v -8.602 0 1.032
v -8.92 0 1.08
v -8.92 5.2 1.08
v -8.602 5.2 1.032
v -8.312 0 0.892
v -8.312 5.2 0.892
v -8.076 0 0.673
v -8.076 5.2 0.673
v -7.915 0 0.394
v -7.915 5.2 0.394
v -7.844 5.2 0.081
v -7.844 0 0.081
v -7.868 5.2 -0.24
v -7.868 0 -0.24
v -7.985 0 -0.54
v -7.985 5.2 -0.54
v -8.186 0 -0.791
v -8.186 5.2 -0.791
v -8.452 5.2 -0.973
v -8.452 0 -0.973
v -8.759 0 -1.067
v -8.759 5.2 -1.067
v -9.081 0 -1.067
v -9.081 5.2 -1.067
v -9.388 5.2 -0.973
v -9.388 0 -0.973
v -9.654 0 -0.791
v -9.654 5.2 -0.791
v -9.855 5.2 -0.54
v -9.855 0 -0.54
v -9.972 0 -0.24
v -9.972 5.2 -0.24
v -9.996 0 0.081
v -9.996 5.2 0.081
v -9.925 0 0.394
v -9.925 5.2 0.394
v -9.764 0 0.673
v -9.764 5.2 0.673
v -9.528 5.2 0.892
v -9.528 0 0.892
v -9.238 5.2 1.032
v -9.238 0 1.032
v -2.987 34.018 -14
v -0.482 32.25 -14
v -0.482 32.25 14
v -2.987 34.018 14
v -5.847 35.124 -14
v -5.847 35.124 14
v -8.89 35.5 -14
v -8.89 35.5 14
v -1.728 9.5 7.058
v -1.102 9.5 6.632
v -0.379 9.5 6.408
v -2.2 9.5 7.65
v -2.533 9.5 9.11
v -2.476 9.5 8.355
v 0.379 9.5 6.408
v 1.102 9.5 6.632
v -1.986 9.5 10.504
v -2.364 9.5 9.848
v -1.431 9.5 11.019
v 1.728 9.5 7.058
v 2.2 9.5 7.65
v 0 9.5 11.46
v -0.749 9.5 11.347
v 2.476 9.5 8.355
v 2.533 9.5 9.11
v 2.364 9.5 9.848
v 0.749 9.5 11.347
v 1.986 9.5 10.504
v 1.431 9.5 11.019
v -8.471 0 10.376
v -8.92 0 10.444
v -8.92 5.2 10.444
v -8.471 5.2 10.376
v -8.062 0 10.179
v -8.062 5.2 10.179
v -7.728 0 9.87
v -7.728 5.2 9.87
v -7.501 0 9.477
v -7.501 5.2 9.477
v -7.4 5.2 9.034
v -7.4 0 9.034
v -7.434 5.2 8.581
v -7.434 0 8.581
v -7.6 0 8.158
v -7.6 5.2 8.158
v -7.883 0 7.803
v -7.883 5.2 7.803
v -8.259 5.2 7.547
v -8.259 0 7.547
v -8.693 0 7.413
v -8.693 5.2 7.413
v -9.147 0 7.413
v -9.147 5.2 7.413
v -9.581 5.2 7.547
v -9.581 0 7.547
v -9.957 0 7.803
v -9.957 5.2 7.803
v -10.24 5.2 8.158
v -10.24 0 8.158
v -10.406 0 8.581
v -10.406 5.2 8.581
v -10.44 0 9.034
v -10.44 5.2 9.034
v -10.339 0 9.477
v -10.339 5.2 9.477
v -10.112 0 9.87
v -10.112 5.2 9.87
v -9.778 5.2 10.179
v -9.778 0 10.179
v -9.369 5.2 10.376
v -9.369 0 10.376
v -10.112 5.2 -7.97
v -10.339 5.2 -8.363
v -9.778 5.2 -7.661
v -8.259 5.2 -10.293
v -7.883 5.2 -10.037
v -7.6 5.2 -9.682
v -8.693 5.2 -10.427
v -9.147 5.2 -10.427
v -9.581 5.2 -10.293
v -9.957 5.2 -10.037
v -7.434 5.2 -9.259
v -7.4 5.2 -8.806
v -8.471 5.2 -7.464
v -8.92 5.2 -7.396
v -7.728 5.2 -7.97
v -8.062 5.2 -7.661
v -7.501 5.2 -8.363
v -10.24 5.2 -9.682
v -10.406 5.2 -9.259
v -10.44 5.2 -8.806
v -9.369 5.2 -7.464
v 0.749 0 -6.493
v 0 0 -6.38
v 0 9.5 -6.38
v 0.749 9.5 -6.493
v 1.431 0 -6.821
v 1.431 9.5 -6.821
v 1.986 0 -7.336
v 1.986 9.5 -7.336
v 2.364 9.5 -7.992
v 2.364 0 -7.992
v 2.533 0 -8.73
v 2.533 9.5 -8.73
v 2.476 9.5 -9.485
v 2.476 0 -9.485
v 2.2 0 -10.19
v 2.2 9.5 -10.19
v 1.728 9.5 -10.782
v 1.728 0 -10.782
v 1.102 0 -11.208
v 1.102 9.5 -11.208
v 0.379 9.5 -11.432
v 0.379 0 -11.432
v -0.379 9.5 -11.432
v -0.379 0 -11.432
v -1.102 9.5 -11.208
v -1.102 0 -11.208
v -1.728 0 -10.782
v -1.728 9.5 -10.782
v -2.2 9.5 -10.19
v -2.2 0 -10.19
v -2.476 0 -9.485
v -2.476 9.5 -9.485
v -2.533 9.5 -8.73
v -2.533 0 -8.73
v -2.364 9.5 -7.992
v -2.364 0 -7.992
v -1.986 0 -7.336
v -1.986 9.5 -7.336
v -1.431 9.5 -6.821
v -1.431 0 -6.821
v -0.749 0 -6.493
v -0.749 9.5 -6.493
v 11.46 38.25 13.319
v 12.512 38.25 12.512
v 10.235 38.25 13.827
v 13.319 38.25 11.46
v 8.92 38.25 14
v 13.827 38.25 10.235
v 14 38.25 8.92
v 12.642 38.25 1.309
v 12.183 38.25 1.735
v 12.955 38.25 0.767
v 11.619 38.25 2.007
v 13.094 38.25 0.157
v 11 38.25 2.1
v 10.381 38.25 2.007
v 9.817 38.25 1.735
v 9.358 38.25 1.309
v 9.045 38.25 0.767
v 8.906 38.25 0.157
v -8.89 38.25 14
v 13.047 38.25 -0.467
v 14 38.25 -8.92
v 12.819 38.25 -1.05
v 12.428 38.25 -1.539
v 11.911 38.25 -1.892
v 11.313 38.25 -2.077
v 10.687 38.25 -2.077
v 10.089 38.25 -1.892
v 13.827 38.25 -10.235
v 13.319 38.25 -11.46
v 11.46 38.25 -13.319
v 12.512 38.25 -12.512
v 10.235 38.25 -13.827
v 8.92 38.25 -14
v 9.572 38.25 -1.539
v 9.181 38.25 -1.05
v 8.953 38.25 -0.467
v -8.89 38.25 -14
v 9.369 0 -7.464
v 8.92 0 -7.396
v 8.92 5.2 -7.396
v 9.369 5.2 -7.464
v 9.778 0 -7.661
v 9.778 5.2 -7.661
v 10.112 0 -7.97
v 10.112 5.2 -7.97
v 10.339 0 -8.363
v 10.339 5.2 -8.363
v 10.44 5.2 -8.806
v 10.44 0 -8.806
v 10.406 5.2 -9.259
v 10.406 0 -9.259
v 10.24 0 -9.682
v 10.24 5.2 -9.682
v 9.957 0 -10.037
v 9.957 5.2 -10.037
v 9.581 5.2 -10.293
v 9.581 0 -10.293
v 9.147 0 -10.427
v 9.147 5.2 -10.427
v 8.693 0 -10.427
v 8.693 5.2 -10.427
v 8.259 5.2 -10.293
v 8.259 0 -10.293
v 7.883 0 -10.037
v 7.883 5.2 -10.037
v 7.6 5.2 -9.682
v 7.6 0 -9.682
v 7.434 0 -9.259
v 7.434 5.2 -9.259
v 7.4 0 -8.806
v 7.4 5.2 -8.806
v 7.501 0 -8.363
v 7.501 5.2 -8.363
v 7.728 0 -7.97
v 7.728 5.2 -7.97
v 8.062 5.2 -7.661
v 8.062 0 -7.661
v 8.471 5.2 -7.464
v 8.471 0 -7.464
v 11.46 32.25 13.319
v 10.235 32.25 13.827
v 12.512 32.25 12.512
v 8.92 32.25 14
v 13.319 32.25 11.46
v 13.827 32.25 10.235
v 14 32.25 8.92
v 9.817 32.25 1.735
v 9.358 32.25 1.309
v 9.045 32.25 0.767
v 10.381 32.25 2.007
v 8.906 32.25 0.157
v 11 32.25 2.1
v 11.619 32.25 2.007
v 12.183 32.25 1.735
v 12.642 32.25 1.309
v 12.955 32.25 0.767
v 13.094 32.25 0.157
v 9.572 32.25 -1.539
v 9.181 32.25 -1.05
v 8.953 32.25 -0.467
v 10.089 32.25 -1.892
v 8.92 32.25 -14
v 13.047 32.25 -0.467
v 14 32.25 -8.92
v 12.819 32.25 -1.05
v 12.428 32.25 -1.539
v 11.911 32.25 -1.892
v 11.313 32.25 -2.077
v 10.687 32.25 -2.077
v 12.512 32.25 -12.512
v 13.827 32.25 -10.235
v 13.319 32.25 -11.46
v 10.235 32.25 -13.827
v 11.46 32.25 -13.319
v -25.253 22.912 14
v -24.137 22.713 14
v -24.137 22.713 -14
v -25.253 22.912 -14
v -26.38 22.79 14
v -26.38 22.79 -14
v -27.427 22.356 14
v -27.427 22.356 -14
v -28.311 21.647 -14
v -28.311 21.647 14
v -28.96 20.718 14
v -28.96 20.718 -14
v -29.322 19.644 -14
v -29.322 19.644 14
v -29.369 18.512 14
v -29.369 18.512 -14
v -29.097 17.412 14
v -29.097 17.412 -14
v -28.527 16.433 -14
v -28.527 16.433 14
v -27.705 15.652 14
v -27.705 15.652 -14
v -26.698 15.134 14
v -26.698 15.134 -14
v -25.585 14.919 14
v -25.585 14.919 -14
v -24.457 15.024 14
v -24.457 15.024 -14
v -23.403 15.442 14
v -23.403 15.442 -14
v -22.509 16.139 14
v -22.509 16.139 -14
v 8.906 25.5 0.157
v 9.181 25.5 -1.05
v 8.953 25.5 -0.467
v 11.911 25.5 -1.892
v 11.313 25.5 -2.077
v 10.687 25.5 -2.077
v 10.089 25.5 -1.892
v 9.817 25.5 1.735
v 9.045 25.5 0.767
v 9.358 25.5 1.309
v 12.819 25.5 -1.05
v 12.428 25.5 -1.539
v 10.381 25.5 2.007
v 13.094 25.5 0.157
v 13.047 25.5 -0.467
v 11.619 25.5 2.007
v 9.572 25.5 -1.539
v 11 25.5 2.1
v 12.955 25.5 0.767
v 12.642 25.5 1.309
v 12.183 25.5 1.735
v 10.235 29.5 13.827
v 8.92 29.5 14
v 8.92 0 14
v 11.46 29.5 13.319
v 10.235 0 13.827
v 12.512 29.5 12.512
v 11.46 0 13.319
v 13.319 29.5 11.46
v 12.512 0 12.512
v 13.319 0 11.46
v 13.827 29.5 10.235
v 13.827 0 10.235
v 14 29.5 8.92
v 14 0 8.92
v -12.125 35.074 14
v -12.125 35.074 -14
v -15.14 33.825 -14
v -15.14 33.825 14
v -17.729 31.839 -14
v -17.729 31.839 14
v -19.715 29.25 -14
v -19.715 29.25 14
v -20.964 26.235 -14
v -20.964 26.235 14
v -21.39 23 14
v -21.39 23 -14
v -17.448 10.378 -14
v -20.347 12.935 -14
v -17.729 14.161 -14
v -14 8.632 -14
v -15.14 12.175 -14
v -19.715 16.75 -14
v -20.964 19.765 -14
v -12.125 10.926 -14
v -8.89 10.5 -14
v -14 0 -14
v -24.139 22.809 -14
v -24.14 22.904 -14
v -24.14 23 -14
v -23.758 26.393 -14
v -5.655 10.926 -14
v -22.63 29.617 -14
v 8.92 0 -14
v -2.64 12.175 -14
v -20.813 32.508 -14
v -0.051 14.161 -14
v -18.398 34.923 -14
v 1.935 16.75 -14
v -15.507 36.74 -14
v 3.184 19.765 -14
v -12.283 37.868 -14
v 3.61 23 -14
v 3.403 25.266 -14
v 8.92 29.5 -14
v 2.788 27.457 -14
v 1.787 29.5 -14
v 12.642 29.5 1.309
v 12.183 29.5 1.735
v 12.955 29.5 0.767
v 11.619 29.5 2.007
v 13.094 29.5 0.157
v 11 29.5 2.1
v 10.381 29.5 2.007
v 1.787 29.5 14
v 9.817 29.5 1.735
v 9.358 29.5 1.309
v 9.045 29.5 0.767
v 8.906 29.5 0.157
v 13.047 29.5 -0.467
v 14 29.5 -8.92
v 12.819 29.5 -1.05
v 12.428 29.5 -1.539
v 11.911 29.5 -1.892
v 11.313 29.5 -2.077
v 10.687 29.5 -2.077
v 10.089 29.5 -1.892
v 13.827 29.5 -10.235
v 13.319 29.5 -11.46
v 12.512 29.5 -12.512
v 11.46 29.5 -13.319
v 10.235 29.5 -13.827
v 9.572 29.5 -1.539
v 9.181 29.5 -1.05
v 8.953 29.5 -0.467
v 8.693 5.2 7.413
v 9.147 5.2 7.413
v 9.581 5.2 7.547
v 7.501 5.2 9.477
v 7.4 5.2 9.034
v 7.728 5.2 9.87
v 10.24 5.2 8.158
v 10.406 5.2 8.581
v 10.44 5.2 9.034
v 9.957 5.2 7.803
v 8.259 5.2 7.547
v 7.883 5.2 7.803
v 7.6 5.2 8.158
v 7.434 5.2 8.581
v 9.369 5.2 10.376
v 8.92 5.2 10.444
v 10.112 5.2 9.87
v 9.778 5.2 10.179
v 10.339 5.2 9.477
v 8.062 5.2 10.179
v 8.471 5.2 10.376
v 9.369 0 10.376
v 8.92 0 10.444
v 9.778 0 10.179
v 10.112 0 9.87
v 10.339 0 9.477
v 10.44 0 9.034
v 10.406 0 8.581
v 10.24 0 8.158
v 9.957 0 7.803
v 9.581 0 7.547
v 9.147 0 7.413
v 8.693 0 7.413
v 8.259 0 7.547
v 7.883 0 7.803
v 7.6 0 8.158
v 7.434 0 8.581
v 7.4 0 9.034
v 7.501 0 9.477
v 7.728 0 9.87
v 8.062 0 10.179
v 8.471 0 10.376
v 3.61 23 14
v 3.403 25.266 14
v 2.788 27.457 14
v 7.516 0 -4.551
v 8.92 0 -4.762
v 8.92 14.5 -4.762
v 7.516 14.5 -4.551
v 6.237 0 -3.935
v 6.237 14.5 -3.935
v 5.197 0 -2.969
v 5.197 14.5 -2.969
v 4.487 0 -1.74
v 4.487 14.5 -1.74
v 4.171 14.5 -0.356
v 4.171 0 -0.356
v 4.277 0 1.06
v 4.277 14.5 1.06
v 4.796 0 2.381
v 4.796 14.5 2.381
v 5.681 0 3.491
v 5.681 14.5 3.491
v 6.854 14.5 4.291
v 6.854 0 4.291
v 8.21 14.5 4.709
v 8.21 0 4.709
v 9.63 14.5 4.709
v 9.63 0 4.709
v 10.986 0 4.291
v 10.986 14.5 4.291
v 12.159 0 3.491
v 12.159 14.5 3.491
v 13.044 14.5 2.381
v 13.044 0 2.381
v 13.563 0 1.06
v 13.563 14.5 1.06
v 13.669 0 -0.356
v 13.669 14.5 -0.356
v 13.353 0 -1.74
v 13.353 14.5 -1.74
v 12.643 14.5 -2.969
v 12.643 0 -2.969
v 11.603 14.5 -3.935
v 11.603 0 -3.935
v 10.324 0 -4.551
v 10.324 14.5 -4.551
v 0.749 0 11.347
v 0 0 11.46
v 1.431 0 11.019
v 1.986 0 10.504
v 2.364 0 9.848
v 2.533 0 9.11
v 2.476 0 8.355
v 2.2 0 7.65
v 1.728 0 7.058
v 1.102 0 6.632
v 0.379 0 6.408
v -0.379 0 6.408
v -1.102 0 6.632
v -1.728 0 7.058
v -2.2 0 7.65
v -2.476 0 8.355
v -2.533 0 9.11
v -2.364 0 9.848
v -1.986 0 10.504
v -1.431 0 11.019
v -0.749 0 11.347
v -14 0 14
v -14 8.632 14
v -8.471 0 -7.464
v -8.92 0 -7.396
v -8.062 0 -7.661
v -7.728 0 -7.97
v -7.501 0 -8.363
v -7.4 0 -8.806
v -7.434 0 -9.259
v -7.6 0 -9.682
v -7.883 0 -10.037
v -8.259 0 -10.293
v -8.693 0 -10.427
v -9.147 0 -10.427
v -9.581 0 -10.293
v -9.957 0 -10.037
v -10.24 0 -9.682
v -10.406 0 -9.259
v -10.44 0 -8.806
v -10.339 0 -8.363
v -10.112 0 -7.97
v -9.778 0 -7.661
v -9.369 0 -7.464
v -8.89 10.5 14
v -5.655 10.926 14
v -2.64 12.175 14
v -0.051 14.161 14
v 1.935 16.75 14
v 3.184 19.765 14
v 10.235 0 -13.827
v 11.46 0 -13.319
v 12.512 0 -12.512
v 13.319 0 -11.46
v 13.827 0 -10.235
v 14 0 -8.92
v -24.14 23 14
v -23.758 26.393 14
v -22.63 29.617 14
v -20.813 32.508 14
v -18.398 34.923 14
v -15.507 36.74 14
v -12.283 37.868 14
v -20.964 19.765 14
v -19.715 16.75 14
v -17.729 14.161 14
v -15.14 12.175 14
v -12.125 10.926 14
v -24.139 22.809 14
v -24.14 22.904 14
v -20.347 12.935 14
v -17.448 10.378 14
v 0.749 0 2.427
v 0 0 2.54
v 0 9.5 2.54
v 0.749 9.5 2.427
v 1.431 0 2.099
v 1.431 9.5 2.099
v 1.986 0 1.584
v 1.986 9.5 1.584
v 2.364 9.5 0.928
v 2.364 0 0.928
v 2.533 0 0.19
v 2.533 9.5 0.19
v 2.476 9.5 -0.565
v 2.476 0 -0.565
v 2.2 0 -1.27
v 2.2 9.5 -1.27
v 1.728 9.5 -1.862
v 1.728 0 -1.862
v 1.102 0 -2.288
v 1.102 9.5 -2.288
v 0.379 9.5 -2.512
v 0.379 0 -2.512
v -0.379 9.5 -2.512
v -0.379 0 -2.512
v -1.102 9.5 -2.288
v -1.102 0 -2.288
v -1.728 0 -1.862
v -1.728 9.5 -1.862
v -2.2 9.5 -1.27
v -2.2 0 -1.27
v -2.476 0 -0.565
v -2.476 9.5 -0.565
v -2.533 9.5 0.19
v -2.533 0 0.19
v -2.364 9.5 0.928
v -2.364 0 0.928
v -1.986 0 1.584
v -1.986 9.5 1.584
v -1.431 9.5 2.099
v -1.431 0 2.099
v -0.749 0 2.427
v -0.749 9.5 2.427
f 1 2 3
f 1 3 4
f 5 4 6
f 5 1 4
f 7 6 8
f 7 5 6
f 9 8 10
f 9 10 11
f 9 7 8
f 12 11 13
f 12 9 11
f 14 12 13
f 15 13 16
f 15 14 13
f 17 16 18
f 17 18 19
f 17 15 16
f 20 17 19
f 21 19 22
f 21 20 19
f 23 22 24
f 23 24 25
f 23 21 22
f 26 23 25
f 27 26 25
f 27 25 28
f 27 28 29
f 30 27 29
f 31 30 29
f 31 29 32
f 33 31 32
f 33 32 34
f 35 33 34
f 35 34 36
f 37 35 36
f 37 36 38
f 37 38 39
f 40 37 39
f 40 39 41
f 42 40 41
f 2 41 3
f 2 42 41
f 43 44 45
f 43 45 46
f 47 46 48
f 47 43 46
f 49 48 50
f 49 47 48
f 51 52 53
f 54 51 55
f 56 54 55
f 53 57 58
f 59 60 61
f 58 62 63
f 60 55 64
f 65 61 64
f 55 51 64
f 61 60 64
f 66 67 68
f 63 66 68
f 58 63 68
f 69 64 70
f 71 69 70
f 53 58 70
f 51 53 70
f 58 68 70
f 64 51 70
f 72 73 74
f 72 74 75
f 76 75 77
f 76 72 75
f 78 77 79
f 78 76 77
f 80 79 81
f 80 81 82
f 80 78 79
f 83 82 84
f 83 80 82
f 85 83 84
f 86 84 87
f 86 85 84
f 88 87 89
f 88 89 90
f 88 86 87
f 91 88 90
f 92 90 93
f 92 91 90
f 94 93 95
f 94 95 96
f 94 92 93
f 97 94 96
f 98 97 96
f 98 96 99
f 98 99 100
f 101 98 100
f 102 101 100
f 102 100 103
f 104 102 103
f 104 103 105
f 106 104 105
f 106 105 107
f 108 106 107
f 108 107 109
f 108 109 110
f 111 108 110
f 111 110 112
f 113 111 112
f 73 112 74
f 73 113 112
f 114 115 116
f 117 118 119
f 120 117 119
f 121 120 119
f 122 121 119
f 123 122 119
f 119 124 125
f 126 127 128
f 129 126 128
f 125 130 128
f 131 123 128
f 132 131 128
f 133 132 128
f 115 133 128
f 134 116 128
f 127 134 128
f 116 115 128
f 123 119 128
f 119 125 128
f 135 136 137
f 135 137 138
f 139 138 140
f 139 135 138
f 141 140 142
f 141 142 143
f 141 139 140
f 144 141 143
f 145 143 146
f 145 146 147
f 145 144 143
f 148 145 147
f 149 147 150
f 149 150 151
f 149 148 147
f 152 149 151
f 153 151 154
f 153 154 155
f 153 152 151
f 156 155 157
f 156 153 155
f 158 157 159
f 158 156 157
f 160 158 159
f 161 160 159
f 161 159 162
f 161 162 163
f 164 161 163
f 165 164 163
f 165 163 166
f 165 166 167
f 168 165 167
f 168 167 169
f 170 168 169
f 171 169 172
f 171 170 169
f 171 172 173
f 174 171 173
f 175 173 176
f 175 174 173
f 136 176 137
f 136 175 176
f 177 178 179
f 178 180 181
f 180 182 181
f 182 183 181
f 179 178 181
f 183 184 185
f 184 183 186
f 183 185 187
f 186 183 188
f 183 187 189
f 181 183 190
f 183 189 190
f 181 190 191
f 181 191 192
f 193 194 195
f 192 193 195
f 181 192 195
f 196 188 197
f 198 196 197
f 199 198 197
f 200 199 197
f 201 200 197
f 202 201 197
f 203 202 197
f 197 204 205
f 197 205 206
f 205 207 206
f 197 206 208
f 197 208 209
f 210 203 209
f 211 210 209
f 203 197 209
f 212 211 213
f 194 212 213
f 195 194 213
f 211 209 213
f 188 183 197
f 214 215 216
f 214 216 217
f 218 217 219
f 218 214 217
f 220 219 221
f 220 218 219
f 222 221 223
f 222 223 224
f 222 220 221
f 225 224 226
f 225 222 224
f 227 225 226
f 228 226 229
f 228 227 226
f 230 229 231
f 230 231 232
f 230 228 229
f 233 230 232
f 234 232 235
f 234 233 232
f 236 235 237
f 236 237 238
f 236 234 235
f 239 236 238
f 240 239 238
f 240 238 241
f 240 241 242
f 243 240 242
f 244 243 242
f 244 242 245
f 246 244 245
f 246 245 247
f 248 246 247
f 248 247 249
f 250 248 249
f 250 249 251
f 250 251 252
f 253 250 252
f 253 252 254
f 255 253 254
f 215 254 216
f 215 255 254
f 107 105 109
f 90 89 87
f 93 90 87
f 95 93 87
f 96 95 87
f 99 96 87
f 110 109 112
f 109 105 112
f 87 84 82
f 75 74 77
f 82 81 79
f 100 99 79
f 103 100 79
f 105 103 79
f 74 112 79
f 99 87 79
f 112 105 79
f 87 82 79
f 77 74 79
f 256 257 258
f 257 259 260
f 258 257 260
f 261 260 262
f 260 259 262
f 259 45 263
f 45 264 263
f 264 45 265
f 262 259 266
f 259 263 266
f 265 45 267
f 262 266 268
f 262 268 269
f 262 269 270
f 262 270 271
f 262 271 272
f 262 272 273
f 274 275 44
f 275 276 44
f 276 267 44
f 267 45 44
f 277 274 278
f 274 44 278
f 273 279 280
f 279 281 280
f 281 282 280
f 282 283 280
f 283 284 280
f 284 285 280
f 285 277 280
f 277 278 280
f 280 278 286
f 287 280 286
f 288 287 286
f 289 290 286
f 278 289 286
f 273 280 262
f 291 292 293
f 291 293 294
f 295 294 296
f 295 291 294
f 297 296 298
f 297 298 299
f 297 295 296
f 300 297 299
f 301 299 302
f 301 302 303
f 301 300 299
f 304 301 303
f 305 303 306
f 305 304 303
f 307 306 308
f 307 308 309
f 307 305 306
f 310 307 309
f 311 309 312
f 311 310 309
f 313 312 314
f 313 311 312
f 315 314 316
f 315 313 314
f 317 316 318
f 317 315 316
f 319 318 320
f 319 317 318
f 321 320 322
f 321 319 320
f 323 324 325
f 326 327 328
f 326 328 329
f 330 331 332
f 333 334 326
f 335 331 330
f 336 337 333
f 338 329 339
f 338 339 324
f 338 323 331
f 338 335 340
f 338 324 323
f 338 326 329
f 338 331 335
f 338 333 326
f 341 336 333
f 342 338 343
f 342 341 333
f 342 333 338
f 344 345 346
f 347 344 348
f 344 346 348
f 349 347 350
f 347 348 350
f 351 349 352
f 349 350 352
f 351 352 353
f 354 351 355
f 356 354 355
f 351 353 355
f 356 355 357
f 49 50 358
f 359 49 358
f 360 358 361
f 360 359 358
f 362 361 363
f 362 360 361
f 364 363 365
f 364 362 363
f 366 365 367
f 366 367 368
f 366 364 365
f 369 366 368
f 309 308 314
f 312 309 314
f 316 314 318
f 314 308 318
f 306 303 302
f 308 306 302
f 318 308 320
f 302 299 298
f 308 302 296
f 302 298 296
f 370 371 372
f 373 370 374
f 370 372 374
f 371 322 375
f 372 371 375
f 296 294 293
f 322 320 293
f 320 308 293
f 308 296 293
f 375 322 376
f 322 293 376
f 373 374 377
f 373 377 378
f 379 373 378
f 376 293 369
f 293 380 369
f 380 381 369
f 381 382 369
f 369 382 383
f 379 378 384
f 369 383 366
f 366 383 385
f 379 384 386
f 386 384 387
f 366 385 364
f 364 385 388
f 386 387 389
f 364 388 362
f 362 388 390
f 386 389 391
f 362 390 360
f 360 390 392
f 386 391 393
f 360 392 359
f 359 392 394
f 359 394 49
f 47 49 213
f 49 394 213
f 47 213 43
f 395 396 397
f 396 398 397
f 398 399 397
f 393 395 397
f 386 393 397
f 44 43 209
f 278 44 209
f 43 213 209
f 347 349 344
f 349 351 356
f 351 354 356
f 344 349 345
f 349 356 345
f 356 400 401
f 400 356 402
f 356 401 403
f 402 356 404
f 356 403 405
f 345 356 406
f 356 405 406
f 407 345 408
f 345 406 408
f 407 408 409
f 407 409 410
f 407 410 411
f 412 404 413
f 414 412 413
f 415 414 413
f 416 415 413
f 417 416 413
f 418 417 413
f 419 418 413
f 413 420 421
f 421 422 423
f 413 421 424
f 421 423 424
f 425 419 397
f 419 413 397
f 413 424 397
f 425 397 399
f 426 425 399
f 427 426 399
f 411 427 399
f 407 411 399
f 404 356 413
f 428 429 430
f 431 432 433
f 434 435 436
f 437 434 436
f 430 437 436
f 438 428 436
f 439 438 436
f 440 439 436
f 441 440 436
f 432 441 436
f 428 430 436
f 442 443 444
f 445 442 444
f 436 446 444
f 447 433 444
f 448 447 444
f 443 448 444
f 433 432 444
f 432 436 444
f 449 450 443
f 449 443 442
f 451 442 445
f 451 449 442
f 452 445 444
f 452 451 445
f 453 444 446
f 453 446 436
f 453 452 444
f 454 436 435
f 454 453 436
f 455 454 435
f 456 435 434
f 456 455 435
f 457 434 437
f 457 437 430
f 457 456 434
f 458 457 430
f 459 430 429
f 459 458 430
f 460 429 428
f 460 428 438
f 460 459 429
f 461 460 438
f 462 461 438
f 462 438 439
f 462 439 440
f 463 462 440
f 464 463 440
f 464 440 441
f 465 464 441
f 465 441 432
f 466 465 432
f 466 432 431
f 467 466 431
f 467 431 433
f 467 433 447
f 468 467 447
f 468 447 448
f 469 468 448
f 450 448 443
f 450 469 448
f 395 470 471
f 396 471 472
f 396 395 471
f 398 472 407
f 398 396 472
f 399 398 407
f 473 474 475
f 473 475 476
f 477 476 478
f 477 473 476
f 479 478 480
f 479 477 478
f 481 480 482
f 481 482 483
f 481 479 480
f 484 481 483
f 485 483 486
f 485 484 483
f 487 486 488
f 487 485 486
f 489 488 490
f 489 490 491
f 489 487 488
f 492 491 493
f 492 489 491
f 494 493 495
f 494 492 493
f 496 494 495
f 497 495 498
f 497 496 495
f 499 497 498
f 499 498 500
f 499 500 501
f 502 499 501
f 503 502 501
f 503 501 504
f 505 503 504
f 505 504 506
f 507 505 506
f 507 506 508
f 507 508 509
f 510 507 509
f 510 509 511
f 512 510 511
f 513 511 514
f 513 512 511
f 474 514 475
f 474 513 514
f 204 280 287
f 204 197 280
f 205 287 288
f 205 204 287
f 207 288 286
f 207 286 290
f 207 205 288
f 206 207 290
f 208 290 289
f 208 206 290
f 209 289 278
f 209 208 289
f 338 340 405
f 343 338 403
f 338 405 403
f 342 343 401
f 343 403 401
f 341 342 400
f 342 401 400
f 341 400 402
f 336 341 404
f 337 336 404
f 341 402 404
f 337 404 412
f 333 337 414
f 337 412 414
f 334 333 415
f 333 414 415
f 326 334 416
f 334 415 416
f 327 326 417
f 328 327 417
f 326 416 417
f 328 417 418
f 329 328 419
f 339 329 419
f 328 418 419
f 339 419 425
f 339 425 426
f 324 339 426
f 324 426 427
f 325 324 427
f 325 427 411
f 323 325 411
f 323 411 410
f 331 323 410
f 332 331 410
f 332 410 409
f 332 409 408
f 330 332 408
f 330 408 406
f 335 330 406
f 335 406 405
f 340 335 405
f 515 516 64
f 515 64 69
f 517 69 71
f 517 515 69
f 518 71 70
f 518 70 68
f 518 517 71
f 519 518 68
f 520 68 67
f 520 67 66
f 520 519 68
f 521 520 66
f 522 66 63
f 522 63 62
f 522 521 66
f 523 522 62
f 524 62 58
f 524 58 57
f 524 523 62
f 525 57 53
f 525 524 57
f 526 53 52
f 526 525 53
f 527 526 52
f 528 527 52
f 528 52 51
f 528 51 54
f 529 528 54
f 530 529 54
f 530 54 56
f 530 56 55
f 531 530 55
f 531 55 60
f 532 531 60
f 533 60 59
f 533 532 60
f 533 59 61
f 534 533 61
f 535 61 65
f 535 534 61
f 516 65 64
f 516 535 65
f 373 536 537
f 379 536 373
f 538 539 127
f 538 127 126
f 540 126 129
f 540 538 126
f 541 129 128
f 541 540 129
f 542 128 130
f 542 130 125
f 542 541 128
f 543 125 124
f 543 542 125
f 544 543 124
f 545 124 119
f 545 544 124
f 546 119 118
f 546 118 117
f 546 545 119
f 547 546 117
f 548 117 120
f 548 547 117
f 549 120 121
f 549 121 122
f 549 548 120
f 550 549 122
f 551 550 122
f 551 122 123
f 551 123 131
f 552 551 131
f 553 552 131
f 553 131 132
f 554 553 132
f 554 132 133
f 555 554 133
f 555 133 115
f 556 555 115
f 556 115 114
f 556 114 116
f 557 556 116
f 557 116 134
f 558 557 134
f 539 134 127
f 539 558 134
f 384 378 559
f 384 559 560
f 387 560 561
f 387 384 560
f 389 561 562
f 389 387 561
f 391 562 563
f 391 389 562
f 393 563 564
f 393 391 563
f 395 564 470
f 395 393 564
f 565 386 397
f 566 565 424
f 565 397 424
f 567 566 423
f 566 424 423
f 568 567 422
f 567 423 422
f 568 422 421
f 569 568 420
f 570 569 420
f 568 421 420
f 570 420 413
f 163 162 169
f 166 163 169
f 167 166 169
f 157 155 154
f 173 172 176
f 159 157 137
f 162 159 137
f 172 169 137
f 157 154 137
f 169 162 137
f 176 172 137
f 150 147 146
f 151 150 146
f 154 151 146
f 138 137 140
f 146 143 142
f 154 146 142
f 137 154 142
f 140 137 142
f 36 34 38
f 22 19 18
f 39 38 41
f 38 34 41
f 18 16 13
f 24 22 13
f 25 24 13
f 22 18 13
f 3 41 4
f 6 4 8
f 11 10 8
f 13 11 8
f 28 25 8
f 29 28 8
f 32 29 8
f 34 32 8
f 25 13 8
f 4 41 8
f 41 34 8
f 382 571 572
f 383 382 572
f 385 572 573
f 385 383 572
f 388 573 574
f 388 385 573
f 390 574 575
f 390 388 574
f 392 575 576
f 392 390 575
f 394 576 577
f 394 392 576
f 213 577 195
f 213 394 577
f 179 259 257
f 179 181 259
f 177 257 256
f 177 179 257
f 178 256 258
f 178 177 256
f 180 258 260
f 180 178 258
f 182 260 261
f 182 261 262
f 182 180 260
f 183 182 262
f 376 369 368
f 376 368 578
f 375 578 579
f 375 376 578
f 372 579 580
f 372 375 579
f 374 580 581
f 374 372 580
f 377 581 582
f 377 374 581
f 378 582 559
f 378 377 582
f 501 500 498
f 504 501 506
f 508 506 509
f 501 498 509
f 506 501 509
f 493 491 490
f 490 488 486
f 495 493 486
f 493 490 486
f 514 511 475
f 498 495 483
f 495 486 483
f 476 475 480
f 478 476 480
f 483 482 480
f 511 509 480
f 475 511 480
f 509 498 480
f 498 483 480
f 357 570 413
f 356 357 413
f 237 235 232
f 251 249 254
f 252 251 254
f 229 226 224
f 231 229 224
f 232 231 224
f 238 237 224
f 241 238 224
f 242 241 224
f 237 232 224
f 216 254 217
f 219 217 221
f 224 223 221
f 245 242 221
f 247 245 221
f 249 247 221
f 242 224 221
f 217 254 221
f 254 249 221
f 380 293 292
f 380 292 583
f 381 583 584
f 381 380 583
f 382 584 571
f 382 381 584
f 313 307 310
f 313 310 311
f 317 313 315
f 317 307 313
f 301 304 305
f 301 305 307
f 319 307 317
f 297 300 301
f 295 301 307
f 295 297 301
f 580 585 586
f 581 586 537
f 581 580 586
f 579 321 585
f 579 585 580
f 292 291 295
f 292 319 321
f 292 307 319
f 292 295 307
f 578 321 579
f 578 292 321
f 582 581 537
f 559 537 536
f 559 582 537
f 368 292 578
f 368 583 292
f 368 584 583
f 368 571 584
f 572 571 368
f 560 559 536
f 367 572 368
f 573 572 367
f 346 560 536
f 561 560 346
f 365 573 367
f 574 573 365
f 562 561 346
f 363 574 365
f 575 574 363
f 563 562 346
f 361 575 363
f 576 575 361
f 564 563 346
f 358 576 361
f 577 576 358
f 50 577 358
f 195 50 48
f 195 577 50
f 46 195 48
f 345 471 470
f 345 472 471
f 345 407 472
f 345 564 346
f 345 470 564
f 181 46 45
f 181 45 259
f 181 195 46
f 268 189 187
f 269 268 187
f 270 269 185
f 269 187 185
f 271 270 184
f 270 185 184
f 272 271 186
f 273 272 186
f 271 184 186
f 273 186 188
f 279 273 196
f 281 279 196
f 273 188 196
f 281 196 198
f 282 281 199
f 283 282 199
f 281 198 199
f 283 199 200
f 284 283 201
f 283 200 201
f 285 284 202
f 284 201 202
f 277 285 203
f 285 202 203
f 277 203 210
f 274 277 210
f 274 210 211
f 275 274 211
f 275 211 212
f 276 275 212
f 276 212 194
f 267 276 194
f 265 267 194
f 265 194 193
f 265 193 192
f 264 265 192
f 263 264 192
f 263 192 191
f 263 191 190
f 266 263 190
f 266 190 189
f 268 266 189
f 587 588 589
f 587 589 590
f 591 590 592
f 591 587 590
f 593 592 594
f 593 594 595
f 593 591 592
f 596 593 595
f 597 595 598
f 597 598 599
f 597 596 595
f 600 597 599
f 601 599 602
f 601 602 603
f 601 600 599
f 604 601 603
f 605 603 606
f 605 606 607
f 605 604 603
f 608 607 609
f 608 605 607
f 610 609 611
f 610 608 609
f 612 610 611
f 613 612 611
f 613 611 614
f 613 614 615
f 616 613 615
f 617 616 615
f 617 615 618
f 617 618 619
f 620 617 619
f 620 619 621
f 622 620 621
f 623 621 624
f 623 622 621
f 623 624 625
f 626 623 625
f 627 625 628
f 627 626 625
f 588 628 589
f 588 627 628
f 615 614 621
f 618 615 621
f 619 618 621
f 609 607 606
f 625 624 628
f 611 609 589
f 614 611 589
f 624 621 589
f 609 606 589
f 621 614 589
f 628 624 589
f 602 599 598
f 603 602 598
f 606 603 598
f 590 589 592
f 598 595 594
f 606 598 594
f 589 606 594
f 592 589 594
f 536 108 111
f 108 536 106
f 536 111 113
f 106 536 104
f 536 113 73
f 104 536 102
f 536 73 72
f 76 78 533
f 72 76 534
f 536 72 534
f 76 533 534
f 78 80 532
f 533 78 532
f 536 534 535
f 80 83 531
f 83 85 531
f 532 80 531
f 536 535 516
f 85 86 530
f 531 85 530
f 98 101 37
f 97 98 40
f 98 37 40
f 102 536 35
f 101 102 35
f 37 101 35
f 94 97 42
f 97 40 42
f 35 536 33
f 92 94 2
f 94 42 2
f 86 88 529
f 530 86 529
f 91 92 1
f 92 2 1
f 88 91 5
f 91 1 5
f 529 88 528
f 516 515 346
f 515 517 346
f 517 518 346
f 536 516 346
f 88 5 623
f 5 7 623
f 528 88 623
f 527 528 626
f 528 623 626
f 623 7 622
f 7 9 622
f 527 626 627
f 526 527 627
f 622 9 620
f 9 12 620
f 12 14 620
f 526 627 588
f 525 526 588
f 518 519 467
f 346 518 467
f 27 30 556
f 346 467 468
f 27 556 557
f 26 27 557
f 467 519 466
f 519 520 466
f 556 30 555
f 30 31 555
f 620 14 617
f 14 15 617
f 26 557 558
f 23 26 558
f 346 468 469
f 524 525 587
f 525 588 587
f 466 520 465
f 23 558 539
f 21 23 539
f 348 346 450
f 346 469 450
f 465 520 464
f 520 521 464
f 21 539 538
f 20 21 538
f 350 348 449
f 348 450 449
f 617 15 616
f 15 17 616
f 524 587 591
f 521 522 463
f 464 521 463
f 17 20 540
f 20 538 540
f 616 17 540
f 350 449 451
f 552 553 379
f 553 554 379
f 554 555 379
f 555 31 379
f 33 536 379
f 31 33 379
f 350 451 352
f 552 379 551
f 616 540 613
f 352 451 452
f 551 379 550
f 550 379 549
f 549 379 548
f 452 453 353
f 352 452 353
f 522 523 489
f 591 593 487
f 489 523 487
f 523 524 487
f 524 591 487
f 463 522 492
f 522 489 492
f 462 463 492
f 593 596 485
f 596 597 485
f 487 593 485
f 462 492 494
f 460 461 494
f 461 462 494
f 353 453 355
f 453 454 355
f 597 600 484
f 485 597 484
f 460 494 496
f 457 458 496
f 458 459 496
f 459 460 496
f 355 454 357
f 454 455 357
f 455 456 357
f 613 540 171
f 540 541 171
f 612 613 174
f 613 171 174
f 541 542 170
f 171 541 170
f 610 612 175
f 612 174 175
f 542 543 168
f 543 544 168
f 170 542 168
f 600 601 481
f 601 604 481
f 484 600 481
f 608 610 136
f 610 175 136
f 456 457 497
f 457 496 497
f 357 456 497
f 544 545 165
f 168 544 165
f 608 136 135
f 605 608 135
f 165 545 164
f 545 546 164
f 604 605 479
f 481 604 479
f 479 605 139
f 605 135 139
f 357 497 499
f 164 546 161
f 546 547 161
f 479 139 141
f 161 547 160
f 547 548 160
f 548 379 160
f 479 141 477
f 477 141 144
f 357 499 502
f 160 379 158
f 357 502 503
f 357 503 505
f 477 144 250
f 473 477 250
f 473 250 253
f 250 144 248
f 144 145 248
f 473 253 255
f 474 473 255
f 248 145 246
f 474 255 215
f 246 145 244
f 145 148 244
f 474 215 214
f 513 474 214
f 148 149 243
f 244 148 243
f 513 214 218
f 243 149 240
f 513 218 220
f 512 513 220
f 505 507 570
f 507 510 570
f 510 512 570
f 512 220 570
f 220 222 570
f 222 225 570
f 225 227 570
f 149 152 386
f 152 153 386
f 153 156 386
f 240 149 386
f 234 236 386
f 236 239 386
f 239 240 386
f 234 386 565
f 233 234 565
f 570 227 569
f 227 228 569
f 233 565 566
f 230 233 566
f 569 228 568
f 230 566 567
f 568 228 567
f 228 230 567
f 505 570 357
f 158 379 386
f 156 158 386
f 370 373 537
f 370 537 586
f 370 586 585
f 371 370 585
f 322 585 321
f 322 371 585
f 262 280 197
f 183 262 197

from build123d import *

# Parameters (mm, degrees)
SKETCH1_W           = 28
SKETCH1_H           = 28
BOSS_EXTRUDE1_DEPTH = 10.5
BOSS_EXTRUDE3_DEPTH = 28
SKETCH3_R           = 4
BOSS_EXTRUDE4_DEPTH = 28
BOSS_EXTRUDE5_START = -28
BOSS_EXTRUDE5_DEPTH = 28
CUT_EXTRUDE1_DEPTH  = 56.774700458
BOSS_EXTRUDE6_START = -28
BOSS_EXTRUDE6_DEPTH = 28
SKETCH8_R           = 2.1
CUT_EXTRUDE2_DEPTH  = 12.75
SKETCH1_4_R         = 1.524
SKETCH1_4_R_2       = 1.0795
CUT_EXTRUDE3_DEPTH  = 5.2
SKETCH1_5_R         = 2.54
CUT_EXTRUDE4_DEPTH  = 9.5
SKETCH1_6_R         = 4.7625
CUT_EXTRUDE5_DEPTH  = 14.5
FILLET1_R           = 5.08
FILLET2_R           = 5.08
FILLET3_R           = 5.08
FILLET4_R           = 5.08


with BuildPart() as part:
    # Sketch1 → Boss-Extrude1 (new body)
    with BuildSketch(Plane(origin=(0, 0, 0), x_dir=(1, 0, 0), z_dir=(0, 1, 0))):
        Rectangle(SKETCH1_W, SKETCH1_H)
    extrude(amount=BOSS_EXTRUDE1_DEPTH)

    # Sketch2 → Boss-Extrude3 (add)
    with BuildSketch(Plane(origin=(0, 0, -14), x_dir=(-1, 0, 0), z_dir=(0, 0, -1))):
        with BuildLine():
            ThreePointArc((21.39, 23), (17.728834765, 14.161165235), (8.89, 10.5))
            Line((8.89, 10.5), (14, 10.5))
            Line((14, 10.5), (14, 8.631618045))
            ThreePointArc((14, 8.631618045), (21.34973515, 14.206962982), (24.14, 23))
            Line((24.14, 23), (21.39, 23))
        make_face()
        with BuildLine():
            Line((8.89, 10.5), (8.89, 7.75))
            ThreePointArc((8.89, 7.75), (11.482747113, 7.972020681), (14, 8.631618045))
            Line((14, 8.631618045), (14, 10.5))
            Line((14, 10.5), (8.89, 10.5))
        make_face()
        with BuildLine():
            Line((0.154297395, 10.5), (8.89, 10.5))
            ThreePointArc((8.89, 10.5), (0.051165235, 14.161165235), (-3.61, 23))
            Line((-3.61, 23), (-6.36, 23))
            ThreePointArc((-6.36, 23), (-4.63371925, 15.952197673), (0.154297395, 10.5))
        make_face()
        with BuildLine():
            ThreePointArc((0.154297395, 10.5), (4.310835229, 8.453737593), (8.89, 7.75))
            Line((8.89, 7.75), (8.89, 10.5))
            Line((8.89, 10.5), (0.154297395, 10.5))
        make_face()
        with BuildLine():
            ThreePointArc((8.89, 35.5), (17.728834765, 31.838834765), (21.39, 23))
            Line((21.39, 23), (24.14, 23))
            ThreePointArc((24.14, 23), (19.673378413, 33.783378413), (8.89, 38.25))
            Line((8.89, 38.25), (8.89, 35.5))
        make_face()
        with BuildLine():
            Line((-6.36, 23), (-3.61, 23))
            ThreePointArc((-3.61, 23), (0.051165235, 31.838834765), (8.89, 35.5))
            Line((8.89, 35.5), (8.89, 38.25))
            ThreePointArc((8.89, 38.25), (-1.893378413, 33.783378413), (-6.36, 23))
        make_face()
    extrude(amount=-BOSS_EXTRUDE3_DEPTH)

    # Sketch3 → Boss-Extrude4 (add)
    with BuildSketch(Plane.XY.offset(14)):
        with Locations((-25.389704171, 18.914002035)):
            Circle(SKETCH3_R)
    extrude(amount=-BOSS_EXTRUDE4_DEPTH)

    # Sketch5 → Boss-Extrude5 (add)
    with BuildSketch(Plane.XY.offset(14).offset(BOSS_EXTRUDE5_START)):
        with BuildLine():
            ThreePointArc((4.905379661, 29.5), (5.846431624, 19.075706053), (-0.154297395, 10.5))
            Line((-0.154297395, 10.5), (14, 10.5))
            Line((14, 10.5), (14, 29.5))
            Line((14, 29.5), (4.905379661, 29.5))
        make_face()
    extrude(amount=BOSS_EXTRUDE5_DEPTH)

    # Sketch6 → Cut-Extrude1 (cut, through all)
    with BuildSketch(Plane.XY.offset(14)):
        with BuildLine():
            Line((14, 29.5), (14, 32.25))
            Line((14, 32.25), (-0.48241414, 32.25))
            ThreePointArc((-0.48241414, 32.25), (0.750888241, 30.956335459), (1.787078252, 29.5))
            Line((1.787078252, 29.5), (14, 29.5))
        make_face()
    extrude(amount=-CUT_EXTRUDE1_DEPTH, mode=Mode.SUBTRACT)

    # Sketch7 → Boss-Extrude6 (add)
    with BuildSketch(Plane.XY.offset(14).offset(BOSS_EXTRUDE6_START)):
        with BuildLine():
            Line((14, 38.25), (-8.89, 38.25))
            ThreePointArc((-8.89, 38.25), (-3.444771469, 37.244717837), (1.282556587, 34.361408032))
            Line((1.282556587, 34.361408032), (6.806, 32.25))
            Line((6.806, 32.25), (14, 32.25))
            Line((14, 32.25), (14, 38.25))
        make_face()
        with BuildLine():
            Line((6.806, 32.25), (1.282556587, 34.361408032))
            ThreePointArc((1.282556587, 34.361408032), (2.308329555, 33.351807338), (3.234355653, 32.25))
            Line((3.234355653, 32.25), (6.806, 32.25))
        make_face()
    extrude(amount=BOSS_EXTRUDE6_DEPTH)

    # Sketch8 → Cut-Extrude2 (cut)
    with BuildSketch(Plane(origin=(0, 38.25, 0), x_dir=(1, 0, 0), z_dir=(0, 1, 0))):
        with Locations(Location((11, 0, 0), (0, 0, 270))):
            Circle(SKETCH8_R)
    extrude(amount=-CUT_EXTRUDE2_DEPTH, mode=Mode.SUBTRACT)

    # Sketch1<4> → Cut-Extrude3 (cut)
    with BuildSketch(Plane(origin=(0, 0, 0), x_dir=(1, 0, 0), z_dir=(0, 1, 0))):
        with Locations(Location((-8.92, 8.92, 0), (0, 0, 270))):
            Circle(SKETCH1_4_R)
        with Locations(Location((8.92, 8.92, 0), (0, 0, 270))):
            Circle(SKETCH1_4_R)
        with Locations(Location((8.92, -8.92, 0), (0, 0, 270))):
            Circle(SKETCH1_4_R)
        with Locations(Location((-8.92, -8.92, 0), (0, 0, 270))):
            Circle(SKETCH1_4_R)
        with Locations(Location((-8.92, 0, 0), (0, 0, 270))):
            Circle(SKETCH1_4_R_2)
    extrude(amount=CUT_EXTRUDE3_DEPTH, mode=Mode.SUBTRACT)

    # Sketch1<5> → Cut-Extrude4 (cut)
    with BuildSketch(Plane(origin=(0, 0, 0), x_dir=(1, 0, 0), z_dir=(0, 1, 0))):
        with Locations(Location((0, 8.92, 0), (0, 0, 270))):
            Circle(SKETCH1_5_R)
        with Locations(Location((0, -8.92, 0), (0, 0, 270))):
            Circle(SKETCH1_5_R)
        with Locations(Location((0, 0, 0), (0, 0, 270))):
            Circle(SKETCH1_5_R)
    extrude(amount=CUT_EXTRUDE4_DEPTH, mode=Mode.SUBTRACT)

    # Sketch1<6> → Cut-Extrude5 (cut)
    with BuildSketch(Plane(origin=(0, 0, 0), x_dir=(1, 0, 0), z_dir=(0, 1, 0))):
        with Locations(Location((8.92, 0, 0), (0, 0, 90))):
            Circle(SKETCH1_6_R)
    extrude(amount=CUT_EXTRUDE5_DEPTH, mode=Mode.SUBTRACT)

    # Fillet1
    fillet1_edges = [part.edges().sort_by_distance(p)[0] for p in [
        (14, 14.75, 14),
    ]]
    fillet(fillet1_edges, radius=FILLET1_R)

    # Fillet2
    fillet2_edges = [part.edges().sort_by_distance(p)[0] for p in [
        (14, 35.25, 14),
    ]]
    fillet(fillet2_edges, radius=FILLET2_R)

    # Fillet3
    fillet3_edges = [part.edges().sort_by_distance(p)[0] for p in [
        (14, 35.25, -14),
    ]]
    fillet(fillet3_edges, radius=FILLET3_R)

    # Fillet4
    fillet4_edges = [part.edges().sort_by_distance(p)[0] for p in [
        (14, 14.75, -14),
    ]]
    fillet(fillet4_edges, radius=FILLET4_R)


solid = part.part
